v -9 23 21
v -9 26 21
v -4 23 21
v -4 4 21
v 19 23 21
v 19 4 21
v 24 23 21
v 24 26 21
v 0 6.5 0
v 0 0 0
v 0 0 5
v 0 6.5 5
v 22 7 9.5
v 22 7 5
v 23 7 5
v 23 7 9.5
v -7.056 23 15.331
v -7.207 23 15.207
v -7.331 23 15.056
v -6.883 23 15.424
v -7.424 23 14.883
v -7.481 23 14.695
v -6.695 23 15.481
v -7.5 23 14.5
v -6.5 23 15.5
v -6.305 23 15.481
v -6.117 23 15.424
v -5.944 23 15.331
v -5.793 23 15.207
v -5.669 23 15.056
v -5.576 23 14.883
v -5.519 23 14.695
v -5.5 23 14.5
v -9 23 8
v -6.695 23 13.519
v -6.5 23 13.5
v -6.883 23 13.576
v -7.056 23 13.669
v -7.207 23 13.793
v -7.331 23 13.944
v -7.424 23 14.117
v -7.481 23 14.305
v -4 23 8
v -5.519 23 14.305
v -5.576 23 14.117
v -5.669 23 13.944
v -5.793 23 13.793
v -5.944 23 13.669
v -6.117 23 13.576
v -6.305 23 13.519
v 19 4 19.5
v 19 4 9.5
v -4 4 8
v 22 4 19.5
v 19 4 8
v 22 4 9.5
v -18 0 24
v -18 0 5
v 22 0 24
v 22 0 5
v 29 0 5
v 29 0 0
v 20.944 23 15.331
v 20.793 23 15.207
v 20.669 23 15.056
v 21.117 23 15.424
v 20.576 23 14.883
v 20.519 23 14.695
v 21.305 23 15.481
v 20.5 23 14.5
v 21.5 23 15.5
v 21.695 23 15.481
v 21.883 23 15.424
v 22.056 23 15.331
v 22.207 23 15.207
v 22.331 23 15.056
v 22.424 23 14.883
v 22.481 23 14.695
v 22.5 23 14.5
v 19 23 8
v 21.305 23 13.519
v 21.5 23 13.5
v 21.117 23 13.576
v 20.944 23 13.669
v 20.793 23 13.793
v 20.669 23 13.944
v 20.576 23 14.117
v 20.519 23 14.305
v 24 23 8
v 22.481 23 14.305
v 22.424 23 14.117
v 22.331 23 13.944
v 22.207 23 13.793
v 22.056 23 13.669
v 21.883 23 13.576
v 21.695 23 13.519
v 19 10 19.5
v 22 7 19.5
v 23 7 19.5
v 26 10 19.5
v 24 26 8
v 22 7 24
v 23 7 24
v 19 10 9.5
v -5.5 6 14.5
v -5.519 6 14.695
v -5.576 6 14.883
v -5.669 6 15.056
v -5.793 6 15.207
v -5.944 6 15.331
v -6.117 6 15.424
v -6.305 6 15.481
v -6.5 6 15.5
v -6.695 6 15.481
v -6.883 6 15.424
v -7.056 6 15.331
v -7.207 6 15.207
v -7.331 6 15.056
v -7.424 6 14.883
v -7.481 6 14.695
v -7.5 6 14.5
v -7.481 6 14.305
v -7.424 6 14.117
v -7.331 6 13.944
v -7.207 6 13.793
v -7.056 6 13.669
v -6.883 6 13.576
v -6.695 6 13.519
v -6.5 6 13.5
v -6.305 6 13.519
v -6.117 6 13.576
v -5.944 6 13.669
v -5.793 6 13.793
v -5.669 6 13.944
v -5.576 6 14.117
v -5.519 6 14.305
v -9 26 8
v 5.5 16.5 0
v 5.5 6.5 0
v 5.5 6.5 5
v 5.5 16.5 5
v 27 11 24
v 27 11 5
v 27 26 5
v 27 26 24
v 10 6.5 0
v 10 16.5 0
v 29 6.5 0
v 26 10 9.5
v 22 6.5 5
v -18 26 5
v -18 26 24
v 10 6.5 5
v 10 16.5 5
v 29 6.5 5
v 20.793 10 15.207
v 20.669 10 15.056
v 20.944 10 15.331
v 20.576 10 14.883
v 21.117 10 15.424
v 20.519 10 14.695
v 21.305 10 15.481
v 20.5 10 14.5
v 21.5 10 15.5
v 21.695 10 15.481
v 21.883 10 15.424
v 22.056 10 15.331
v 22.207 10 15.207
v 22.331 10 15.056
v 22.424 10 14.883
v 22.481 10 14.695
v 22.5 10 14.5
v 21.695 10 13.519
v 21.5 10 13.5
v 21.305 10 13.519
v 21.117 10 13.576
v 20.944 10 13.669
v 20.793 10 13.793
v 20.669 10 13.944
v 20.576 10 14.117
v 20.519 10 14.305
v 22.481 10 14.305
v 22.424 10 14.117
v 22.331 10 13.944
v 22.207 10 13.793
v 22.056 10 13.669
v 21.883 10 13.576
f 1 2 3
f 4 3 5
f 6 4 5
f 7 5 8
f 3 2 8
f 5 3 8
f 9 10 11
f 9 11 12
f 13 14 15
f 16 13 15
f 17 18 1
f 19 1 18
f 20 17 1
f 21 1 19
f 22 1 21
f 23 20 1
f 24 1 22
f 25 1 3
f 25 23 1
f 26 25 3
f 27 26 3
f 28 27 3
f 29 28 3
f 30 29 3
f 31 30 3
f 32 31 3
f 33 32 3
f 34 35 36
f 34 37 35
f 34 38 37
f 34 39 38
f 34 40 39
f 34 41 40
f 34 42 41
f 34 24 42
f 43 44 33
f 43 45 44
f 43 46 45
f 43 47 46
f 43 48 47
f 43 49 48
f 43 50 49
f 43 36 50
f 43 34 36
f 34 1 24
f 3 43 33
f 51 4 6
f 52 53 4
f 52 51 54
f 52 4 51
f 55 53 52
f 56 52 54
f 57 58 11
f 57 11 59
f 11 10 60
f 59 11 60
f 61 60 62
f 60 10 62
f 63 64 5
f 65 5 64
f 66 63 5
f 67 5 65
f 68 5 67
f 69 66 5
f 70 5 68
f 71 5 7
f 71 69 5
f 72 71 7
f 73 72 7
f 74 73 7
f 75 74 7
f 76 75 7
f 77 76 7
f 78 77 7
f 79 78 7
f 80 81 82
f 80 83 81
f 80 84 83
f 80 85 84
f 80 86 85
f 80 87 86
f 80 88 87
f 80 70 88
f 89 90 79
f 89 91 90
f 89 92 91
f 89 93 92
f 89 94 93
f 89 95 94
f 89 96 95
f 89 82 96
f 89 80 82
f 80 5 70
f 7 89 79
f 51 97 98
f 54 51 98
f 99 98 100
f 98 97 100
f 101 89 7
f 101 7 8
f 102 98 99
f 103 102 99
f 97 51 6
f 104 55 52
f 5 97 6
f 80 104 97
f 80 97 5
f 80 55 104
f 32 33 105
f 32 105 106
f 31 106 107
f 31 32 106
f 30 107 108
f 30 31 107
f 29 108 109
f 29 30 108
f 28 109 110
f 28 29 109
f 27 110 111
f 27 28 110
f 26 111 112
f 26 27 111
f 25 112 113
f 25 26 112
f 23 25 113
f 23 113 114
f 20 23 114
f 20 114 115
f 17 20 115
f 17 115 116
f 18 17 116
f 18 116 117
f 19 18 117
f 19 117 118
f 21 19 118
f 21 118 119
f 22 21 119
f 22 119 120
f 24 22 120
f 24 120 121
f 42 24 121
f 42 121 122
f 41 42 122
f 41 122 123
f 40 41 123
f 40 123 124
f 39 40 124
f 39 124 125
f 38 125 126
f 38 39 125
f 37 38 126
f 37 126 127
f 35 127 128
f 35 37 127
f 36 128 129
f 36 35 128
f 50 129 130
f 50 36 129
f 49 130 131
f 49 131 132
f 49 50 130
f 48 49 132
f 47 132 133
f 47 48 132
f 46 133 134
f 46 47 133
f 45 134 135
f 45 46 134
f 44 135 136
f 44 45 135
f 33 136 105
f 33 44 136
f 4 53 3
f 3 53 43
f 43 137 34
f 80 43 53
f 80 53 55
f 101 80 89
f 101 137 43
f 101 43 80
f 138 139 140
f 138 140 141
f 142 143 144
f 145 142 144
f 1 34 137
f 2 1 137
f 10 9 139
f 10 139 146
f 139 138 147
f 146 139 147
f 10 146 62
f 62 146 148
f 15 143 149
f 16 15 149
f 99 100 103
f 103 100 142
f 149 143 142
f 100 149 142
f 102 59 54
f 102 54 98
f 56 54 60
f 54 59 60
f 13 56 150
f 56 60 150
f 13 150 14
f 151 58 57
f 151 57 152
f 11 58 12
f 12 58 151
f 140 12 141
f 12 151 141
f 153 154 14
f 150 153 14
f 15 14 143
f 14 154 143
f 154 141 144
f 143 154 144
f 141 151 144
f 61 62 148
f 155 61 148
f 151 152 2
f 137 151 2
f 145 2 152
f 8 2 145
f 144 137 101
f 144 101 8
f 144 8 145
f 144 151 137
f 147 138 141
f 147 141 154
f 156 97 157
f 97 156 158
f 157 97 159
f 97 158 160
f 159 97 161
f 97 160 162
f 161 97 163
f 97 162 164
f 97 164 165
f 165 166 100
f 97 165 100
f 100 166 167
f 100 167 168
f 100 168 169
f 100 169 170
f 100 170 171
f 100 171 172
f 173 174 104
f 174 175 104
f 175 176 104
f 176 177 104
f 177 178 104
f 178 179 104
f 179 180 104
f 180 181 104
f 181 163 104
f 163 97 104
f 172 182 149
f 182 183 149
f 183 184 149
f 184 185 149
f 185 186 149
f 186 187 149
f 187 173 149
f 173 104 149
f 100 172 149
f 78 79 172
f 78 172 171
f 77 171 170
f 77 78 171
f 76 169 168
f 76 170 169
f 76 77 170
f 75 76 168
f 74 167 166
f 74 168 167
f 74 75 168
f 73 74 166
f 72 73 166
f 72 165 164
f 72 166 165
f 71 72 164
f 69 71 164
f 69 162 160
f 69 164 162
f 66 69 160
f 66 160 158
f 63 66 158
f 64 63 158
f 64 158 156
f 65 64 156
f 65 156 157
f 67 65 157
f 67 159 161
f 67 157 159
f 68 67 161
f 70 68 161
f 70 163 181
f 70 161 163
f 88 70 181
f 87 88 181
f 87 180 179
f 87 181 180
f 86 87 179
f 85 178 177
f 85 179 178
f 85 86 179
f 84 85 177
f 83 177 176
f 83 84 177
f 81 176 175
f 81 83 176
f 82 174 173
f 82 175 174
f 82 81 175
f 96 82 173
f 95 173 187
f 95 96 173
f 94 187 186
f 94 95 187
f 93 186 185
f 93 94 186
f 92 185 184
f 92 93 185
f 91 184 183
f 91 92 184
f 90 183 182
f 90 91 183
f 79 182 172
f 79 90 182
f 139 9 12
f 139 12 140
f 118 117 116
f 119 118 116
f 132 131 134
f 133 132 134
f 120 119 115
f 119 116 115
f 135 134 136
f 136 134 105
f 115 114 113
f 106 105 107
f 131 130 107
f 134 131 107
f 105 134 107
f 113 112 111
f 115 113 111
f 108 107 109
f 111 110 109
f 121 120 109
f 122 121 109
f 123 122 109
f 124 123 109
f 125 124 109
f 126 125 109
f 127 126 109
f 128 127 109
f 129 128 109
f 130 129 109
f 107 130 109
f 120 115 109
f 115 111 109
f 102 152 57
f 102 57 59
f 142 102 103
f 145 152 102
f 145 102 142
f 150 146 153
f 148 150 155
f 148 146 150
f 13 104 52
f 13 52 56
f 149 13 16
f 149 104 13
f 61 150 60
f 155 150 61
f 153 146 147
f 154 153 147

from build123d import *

# Parameters (mm, degrees)
CYLINDER_R             = 1
CYLINDER_DEPTH         = 20
CYLINDER_ROLL_ANGLE    = 90
BOX003_W               = 23
BOX003_H               = 19
BOX003_DEPTH           = 13
BOX004_W               = 33
BOX004_H               = 3
BOX004_DEPTH           = 13
CYLINDER001_R          = 1
CYLINDER001_DEPTH      = 20
CYLINDER001_ROLL_ANGLE = 90
BOX006_W               = 13
BOX006_H               = 6
BOX006_DEPTH           = 10
BOX005_W               = 5
BOX005_H               = 19
BOX005_DEPTH           = 19
CHAMFER_SIZE           = 4
BOX_W                  = 29
BOX_H                  = 6.5
BOX_DEPTH              = 5
BOX001_W               = 4.5
BOX001_H               = 10
BOX001_DEPTH           = 5
BOX002_W               = 40
BOX002_H               = 26
BOX002_DEPTH           = 19


with BuildPart() as cilindro:
    # Cylinder → Cylinder (new body)
    with BuildSketch(Plane.XY):
        Circle(CYLINDER_R)
    extrude(amount=CYLINDER_DEPTH)


with BuildPart() as cilindro_1:
    # Cylinder roll: moved
    add(cilindro.part.rotate(Axis((0, 0, 0), (1, 0, 0)), CYLINDER_ROLL_ANGLE))


with BuildPart() as cilindro_2:
    # Cylinder placement: moved
    add(cilindro_1.part.moved(Location((-2.5, 55, 6.5))))


with BuildPart() as cubo003:
    # Box003 → Box003 (new body)
    with BuildSketch(Plane(origin=(0, 33, 0), x_dir=(1, 0, 0), z_dir=(0, 0, 1))):
        with Locations((11.5, 9.5)):
            Rectangle(BOX003_W, BOX003_H)
    extrude(amount=BOX003_DEPTH)


with BuildPart() as fusion002:
    # Box004 → Box004 (new body)
    with BuildSketch(Plane(origin=(-5, 52, 0), x_dir=(1, 0, 0), z_dir=(0, 0, 1))):
        with Locations((16.5, 1.5)):
            Rectangle(BOX004_W, BOX004_H)
    extrude(amount=BOX004_DEPTH)

    # Fusion002: union Cubo003
    add(cubo003.part)


with BuildPart() as servo_model:
    # Cylinder001 → Cylinder001 (new body)
    with BuildSketch(Plane.XY):
        Circle(CYLINDER001_R)
    extrude(amount=CYLINDER001_DEPTH)


with BuildPart() as servo_model_1:
    # Cylinder001 roll: moved
    add(servo_model.part.rotate(Axis((0, 0, 0), (1, 0, 0)), CYLINDER001_ROLL_ANGLE))


with BuildPart() as servo_model_2:
    # Cylinder001 placement: moved
    add(servo_model_1.part.moved(Location((25.5, 55, 6.5))))

    # Fusion003: union Cilindro, Fusion002
    add(cilindro_2.part)
    add(fusion002.part)


with BuildPart() as servo_model_3:
    # Fusion003 placement: moved
    add(servo_model_2.part.moved(Location((-4, -1, 13))))


with BuildPart() as servo_cable_model:
    # Box006 → Box006 (new body)
    with BuildSketch(Plane(origin=(17, 32, 14.5), x_dir=(1, 0, 0), z_dir=(0, 0, 1))):
        with Locations((6.5, 3)):
            Rectangle(BOX006_W, BOX006_H)
    extrude(amount=BOX006_DEPTH)

    # Fusion005: union Servo_Model
    add(servo_model_3.part)


with BuildPart() as servo_cable_model_1:
    # Fusion005 placement: moved
    add(servo_cable_model.part.moved(Location((0, -28, 0))))


with BuildPart() as chamfer_body:
    # Box005 → Box005 (new body)
    with BuildSketch(Plane(origin=(22, 7, 10), x_dir=(1, 0, 0), z_dir=(0, 0, 1))):
        with Locations((2.5, 9.5)):
            Rectangle(BOX005_W, BOX005_H)
    extrude(amount=BOX005_DEPTH)

    # Chamfer
    chamfer_edges = [chamfer_body.edges().sort_by_distance(p)[0] for p in [
        (27, 7, 19.5),
    ]]
    chamfer(chamfer_edges, length=CHAMFER_SIZE)


with BuildPart() as cubo:
    # Box → Box (new body)
    with BuildSketch(Plane.XY.offset(5)):
        with Locations((14.5, 3.25)):
            Rectangle(BOX_W, BOX_H)
    extrude(amount=BOX_DEPTH)


with BuildPart() as fusion:
    # Box001 → Box001 (new body)
    with BuildSketch(Plane(origin=(5.5, 6.5, 5), x_dir=(1, 0, 0), z_dir=(0, 0, 1))):
        with Locations((2.25, 5)):
            Rectangle(BOX001_W, BOX001_H)
    extrude(amount=BOX001_DEPTH)

    # Fusion: union Cubo
    add(cubo.part)


with BuildPart() as pieza_sujeccion_servo:
    # Box002 → Box002 (new body)
    with BuildSketch(Plane(origin=(-18, 0, 10), x_dir=(1, 0, 0), z_dir=(0, 0, 1))):
        with Locations((20, 13)):
            Rectangle(BOX002_W, BOX002_H)
    extrude(amount=BOX002_DEPTH)

    # Fusion001: union Fusion
    add(fusion.part)

    # Fusion004: union Chamfer body
    add(chamfer_body.part)

    # Cut: cut Servo_Cable_model
    add(servo_cable_model_1.part, mode=Mode.SUBTRACT)


with BuildPart() as pieza_sujeccion_servo_1:
    # Cut placement: moved
    add(pieza_sujeccion_servo.part.moved(Location((0, 0, -5))))


solid = pieza_sujeccion_servo_1.part
